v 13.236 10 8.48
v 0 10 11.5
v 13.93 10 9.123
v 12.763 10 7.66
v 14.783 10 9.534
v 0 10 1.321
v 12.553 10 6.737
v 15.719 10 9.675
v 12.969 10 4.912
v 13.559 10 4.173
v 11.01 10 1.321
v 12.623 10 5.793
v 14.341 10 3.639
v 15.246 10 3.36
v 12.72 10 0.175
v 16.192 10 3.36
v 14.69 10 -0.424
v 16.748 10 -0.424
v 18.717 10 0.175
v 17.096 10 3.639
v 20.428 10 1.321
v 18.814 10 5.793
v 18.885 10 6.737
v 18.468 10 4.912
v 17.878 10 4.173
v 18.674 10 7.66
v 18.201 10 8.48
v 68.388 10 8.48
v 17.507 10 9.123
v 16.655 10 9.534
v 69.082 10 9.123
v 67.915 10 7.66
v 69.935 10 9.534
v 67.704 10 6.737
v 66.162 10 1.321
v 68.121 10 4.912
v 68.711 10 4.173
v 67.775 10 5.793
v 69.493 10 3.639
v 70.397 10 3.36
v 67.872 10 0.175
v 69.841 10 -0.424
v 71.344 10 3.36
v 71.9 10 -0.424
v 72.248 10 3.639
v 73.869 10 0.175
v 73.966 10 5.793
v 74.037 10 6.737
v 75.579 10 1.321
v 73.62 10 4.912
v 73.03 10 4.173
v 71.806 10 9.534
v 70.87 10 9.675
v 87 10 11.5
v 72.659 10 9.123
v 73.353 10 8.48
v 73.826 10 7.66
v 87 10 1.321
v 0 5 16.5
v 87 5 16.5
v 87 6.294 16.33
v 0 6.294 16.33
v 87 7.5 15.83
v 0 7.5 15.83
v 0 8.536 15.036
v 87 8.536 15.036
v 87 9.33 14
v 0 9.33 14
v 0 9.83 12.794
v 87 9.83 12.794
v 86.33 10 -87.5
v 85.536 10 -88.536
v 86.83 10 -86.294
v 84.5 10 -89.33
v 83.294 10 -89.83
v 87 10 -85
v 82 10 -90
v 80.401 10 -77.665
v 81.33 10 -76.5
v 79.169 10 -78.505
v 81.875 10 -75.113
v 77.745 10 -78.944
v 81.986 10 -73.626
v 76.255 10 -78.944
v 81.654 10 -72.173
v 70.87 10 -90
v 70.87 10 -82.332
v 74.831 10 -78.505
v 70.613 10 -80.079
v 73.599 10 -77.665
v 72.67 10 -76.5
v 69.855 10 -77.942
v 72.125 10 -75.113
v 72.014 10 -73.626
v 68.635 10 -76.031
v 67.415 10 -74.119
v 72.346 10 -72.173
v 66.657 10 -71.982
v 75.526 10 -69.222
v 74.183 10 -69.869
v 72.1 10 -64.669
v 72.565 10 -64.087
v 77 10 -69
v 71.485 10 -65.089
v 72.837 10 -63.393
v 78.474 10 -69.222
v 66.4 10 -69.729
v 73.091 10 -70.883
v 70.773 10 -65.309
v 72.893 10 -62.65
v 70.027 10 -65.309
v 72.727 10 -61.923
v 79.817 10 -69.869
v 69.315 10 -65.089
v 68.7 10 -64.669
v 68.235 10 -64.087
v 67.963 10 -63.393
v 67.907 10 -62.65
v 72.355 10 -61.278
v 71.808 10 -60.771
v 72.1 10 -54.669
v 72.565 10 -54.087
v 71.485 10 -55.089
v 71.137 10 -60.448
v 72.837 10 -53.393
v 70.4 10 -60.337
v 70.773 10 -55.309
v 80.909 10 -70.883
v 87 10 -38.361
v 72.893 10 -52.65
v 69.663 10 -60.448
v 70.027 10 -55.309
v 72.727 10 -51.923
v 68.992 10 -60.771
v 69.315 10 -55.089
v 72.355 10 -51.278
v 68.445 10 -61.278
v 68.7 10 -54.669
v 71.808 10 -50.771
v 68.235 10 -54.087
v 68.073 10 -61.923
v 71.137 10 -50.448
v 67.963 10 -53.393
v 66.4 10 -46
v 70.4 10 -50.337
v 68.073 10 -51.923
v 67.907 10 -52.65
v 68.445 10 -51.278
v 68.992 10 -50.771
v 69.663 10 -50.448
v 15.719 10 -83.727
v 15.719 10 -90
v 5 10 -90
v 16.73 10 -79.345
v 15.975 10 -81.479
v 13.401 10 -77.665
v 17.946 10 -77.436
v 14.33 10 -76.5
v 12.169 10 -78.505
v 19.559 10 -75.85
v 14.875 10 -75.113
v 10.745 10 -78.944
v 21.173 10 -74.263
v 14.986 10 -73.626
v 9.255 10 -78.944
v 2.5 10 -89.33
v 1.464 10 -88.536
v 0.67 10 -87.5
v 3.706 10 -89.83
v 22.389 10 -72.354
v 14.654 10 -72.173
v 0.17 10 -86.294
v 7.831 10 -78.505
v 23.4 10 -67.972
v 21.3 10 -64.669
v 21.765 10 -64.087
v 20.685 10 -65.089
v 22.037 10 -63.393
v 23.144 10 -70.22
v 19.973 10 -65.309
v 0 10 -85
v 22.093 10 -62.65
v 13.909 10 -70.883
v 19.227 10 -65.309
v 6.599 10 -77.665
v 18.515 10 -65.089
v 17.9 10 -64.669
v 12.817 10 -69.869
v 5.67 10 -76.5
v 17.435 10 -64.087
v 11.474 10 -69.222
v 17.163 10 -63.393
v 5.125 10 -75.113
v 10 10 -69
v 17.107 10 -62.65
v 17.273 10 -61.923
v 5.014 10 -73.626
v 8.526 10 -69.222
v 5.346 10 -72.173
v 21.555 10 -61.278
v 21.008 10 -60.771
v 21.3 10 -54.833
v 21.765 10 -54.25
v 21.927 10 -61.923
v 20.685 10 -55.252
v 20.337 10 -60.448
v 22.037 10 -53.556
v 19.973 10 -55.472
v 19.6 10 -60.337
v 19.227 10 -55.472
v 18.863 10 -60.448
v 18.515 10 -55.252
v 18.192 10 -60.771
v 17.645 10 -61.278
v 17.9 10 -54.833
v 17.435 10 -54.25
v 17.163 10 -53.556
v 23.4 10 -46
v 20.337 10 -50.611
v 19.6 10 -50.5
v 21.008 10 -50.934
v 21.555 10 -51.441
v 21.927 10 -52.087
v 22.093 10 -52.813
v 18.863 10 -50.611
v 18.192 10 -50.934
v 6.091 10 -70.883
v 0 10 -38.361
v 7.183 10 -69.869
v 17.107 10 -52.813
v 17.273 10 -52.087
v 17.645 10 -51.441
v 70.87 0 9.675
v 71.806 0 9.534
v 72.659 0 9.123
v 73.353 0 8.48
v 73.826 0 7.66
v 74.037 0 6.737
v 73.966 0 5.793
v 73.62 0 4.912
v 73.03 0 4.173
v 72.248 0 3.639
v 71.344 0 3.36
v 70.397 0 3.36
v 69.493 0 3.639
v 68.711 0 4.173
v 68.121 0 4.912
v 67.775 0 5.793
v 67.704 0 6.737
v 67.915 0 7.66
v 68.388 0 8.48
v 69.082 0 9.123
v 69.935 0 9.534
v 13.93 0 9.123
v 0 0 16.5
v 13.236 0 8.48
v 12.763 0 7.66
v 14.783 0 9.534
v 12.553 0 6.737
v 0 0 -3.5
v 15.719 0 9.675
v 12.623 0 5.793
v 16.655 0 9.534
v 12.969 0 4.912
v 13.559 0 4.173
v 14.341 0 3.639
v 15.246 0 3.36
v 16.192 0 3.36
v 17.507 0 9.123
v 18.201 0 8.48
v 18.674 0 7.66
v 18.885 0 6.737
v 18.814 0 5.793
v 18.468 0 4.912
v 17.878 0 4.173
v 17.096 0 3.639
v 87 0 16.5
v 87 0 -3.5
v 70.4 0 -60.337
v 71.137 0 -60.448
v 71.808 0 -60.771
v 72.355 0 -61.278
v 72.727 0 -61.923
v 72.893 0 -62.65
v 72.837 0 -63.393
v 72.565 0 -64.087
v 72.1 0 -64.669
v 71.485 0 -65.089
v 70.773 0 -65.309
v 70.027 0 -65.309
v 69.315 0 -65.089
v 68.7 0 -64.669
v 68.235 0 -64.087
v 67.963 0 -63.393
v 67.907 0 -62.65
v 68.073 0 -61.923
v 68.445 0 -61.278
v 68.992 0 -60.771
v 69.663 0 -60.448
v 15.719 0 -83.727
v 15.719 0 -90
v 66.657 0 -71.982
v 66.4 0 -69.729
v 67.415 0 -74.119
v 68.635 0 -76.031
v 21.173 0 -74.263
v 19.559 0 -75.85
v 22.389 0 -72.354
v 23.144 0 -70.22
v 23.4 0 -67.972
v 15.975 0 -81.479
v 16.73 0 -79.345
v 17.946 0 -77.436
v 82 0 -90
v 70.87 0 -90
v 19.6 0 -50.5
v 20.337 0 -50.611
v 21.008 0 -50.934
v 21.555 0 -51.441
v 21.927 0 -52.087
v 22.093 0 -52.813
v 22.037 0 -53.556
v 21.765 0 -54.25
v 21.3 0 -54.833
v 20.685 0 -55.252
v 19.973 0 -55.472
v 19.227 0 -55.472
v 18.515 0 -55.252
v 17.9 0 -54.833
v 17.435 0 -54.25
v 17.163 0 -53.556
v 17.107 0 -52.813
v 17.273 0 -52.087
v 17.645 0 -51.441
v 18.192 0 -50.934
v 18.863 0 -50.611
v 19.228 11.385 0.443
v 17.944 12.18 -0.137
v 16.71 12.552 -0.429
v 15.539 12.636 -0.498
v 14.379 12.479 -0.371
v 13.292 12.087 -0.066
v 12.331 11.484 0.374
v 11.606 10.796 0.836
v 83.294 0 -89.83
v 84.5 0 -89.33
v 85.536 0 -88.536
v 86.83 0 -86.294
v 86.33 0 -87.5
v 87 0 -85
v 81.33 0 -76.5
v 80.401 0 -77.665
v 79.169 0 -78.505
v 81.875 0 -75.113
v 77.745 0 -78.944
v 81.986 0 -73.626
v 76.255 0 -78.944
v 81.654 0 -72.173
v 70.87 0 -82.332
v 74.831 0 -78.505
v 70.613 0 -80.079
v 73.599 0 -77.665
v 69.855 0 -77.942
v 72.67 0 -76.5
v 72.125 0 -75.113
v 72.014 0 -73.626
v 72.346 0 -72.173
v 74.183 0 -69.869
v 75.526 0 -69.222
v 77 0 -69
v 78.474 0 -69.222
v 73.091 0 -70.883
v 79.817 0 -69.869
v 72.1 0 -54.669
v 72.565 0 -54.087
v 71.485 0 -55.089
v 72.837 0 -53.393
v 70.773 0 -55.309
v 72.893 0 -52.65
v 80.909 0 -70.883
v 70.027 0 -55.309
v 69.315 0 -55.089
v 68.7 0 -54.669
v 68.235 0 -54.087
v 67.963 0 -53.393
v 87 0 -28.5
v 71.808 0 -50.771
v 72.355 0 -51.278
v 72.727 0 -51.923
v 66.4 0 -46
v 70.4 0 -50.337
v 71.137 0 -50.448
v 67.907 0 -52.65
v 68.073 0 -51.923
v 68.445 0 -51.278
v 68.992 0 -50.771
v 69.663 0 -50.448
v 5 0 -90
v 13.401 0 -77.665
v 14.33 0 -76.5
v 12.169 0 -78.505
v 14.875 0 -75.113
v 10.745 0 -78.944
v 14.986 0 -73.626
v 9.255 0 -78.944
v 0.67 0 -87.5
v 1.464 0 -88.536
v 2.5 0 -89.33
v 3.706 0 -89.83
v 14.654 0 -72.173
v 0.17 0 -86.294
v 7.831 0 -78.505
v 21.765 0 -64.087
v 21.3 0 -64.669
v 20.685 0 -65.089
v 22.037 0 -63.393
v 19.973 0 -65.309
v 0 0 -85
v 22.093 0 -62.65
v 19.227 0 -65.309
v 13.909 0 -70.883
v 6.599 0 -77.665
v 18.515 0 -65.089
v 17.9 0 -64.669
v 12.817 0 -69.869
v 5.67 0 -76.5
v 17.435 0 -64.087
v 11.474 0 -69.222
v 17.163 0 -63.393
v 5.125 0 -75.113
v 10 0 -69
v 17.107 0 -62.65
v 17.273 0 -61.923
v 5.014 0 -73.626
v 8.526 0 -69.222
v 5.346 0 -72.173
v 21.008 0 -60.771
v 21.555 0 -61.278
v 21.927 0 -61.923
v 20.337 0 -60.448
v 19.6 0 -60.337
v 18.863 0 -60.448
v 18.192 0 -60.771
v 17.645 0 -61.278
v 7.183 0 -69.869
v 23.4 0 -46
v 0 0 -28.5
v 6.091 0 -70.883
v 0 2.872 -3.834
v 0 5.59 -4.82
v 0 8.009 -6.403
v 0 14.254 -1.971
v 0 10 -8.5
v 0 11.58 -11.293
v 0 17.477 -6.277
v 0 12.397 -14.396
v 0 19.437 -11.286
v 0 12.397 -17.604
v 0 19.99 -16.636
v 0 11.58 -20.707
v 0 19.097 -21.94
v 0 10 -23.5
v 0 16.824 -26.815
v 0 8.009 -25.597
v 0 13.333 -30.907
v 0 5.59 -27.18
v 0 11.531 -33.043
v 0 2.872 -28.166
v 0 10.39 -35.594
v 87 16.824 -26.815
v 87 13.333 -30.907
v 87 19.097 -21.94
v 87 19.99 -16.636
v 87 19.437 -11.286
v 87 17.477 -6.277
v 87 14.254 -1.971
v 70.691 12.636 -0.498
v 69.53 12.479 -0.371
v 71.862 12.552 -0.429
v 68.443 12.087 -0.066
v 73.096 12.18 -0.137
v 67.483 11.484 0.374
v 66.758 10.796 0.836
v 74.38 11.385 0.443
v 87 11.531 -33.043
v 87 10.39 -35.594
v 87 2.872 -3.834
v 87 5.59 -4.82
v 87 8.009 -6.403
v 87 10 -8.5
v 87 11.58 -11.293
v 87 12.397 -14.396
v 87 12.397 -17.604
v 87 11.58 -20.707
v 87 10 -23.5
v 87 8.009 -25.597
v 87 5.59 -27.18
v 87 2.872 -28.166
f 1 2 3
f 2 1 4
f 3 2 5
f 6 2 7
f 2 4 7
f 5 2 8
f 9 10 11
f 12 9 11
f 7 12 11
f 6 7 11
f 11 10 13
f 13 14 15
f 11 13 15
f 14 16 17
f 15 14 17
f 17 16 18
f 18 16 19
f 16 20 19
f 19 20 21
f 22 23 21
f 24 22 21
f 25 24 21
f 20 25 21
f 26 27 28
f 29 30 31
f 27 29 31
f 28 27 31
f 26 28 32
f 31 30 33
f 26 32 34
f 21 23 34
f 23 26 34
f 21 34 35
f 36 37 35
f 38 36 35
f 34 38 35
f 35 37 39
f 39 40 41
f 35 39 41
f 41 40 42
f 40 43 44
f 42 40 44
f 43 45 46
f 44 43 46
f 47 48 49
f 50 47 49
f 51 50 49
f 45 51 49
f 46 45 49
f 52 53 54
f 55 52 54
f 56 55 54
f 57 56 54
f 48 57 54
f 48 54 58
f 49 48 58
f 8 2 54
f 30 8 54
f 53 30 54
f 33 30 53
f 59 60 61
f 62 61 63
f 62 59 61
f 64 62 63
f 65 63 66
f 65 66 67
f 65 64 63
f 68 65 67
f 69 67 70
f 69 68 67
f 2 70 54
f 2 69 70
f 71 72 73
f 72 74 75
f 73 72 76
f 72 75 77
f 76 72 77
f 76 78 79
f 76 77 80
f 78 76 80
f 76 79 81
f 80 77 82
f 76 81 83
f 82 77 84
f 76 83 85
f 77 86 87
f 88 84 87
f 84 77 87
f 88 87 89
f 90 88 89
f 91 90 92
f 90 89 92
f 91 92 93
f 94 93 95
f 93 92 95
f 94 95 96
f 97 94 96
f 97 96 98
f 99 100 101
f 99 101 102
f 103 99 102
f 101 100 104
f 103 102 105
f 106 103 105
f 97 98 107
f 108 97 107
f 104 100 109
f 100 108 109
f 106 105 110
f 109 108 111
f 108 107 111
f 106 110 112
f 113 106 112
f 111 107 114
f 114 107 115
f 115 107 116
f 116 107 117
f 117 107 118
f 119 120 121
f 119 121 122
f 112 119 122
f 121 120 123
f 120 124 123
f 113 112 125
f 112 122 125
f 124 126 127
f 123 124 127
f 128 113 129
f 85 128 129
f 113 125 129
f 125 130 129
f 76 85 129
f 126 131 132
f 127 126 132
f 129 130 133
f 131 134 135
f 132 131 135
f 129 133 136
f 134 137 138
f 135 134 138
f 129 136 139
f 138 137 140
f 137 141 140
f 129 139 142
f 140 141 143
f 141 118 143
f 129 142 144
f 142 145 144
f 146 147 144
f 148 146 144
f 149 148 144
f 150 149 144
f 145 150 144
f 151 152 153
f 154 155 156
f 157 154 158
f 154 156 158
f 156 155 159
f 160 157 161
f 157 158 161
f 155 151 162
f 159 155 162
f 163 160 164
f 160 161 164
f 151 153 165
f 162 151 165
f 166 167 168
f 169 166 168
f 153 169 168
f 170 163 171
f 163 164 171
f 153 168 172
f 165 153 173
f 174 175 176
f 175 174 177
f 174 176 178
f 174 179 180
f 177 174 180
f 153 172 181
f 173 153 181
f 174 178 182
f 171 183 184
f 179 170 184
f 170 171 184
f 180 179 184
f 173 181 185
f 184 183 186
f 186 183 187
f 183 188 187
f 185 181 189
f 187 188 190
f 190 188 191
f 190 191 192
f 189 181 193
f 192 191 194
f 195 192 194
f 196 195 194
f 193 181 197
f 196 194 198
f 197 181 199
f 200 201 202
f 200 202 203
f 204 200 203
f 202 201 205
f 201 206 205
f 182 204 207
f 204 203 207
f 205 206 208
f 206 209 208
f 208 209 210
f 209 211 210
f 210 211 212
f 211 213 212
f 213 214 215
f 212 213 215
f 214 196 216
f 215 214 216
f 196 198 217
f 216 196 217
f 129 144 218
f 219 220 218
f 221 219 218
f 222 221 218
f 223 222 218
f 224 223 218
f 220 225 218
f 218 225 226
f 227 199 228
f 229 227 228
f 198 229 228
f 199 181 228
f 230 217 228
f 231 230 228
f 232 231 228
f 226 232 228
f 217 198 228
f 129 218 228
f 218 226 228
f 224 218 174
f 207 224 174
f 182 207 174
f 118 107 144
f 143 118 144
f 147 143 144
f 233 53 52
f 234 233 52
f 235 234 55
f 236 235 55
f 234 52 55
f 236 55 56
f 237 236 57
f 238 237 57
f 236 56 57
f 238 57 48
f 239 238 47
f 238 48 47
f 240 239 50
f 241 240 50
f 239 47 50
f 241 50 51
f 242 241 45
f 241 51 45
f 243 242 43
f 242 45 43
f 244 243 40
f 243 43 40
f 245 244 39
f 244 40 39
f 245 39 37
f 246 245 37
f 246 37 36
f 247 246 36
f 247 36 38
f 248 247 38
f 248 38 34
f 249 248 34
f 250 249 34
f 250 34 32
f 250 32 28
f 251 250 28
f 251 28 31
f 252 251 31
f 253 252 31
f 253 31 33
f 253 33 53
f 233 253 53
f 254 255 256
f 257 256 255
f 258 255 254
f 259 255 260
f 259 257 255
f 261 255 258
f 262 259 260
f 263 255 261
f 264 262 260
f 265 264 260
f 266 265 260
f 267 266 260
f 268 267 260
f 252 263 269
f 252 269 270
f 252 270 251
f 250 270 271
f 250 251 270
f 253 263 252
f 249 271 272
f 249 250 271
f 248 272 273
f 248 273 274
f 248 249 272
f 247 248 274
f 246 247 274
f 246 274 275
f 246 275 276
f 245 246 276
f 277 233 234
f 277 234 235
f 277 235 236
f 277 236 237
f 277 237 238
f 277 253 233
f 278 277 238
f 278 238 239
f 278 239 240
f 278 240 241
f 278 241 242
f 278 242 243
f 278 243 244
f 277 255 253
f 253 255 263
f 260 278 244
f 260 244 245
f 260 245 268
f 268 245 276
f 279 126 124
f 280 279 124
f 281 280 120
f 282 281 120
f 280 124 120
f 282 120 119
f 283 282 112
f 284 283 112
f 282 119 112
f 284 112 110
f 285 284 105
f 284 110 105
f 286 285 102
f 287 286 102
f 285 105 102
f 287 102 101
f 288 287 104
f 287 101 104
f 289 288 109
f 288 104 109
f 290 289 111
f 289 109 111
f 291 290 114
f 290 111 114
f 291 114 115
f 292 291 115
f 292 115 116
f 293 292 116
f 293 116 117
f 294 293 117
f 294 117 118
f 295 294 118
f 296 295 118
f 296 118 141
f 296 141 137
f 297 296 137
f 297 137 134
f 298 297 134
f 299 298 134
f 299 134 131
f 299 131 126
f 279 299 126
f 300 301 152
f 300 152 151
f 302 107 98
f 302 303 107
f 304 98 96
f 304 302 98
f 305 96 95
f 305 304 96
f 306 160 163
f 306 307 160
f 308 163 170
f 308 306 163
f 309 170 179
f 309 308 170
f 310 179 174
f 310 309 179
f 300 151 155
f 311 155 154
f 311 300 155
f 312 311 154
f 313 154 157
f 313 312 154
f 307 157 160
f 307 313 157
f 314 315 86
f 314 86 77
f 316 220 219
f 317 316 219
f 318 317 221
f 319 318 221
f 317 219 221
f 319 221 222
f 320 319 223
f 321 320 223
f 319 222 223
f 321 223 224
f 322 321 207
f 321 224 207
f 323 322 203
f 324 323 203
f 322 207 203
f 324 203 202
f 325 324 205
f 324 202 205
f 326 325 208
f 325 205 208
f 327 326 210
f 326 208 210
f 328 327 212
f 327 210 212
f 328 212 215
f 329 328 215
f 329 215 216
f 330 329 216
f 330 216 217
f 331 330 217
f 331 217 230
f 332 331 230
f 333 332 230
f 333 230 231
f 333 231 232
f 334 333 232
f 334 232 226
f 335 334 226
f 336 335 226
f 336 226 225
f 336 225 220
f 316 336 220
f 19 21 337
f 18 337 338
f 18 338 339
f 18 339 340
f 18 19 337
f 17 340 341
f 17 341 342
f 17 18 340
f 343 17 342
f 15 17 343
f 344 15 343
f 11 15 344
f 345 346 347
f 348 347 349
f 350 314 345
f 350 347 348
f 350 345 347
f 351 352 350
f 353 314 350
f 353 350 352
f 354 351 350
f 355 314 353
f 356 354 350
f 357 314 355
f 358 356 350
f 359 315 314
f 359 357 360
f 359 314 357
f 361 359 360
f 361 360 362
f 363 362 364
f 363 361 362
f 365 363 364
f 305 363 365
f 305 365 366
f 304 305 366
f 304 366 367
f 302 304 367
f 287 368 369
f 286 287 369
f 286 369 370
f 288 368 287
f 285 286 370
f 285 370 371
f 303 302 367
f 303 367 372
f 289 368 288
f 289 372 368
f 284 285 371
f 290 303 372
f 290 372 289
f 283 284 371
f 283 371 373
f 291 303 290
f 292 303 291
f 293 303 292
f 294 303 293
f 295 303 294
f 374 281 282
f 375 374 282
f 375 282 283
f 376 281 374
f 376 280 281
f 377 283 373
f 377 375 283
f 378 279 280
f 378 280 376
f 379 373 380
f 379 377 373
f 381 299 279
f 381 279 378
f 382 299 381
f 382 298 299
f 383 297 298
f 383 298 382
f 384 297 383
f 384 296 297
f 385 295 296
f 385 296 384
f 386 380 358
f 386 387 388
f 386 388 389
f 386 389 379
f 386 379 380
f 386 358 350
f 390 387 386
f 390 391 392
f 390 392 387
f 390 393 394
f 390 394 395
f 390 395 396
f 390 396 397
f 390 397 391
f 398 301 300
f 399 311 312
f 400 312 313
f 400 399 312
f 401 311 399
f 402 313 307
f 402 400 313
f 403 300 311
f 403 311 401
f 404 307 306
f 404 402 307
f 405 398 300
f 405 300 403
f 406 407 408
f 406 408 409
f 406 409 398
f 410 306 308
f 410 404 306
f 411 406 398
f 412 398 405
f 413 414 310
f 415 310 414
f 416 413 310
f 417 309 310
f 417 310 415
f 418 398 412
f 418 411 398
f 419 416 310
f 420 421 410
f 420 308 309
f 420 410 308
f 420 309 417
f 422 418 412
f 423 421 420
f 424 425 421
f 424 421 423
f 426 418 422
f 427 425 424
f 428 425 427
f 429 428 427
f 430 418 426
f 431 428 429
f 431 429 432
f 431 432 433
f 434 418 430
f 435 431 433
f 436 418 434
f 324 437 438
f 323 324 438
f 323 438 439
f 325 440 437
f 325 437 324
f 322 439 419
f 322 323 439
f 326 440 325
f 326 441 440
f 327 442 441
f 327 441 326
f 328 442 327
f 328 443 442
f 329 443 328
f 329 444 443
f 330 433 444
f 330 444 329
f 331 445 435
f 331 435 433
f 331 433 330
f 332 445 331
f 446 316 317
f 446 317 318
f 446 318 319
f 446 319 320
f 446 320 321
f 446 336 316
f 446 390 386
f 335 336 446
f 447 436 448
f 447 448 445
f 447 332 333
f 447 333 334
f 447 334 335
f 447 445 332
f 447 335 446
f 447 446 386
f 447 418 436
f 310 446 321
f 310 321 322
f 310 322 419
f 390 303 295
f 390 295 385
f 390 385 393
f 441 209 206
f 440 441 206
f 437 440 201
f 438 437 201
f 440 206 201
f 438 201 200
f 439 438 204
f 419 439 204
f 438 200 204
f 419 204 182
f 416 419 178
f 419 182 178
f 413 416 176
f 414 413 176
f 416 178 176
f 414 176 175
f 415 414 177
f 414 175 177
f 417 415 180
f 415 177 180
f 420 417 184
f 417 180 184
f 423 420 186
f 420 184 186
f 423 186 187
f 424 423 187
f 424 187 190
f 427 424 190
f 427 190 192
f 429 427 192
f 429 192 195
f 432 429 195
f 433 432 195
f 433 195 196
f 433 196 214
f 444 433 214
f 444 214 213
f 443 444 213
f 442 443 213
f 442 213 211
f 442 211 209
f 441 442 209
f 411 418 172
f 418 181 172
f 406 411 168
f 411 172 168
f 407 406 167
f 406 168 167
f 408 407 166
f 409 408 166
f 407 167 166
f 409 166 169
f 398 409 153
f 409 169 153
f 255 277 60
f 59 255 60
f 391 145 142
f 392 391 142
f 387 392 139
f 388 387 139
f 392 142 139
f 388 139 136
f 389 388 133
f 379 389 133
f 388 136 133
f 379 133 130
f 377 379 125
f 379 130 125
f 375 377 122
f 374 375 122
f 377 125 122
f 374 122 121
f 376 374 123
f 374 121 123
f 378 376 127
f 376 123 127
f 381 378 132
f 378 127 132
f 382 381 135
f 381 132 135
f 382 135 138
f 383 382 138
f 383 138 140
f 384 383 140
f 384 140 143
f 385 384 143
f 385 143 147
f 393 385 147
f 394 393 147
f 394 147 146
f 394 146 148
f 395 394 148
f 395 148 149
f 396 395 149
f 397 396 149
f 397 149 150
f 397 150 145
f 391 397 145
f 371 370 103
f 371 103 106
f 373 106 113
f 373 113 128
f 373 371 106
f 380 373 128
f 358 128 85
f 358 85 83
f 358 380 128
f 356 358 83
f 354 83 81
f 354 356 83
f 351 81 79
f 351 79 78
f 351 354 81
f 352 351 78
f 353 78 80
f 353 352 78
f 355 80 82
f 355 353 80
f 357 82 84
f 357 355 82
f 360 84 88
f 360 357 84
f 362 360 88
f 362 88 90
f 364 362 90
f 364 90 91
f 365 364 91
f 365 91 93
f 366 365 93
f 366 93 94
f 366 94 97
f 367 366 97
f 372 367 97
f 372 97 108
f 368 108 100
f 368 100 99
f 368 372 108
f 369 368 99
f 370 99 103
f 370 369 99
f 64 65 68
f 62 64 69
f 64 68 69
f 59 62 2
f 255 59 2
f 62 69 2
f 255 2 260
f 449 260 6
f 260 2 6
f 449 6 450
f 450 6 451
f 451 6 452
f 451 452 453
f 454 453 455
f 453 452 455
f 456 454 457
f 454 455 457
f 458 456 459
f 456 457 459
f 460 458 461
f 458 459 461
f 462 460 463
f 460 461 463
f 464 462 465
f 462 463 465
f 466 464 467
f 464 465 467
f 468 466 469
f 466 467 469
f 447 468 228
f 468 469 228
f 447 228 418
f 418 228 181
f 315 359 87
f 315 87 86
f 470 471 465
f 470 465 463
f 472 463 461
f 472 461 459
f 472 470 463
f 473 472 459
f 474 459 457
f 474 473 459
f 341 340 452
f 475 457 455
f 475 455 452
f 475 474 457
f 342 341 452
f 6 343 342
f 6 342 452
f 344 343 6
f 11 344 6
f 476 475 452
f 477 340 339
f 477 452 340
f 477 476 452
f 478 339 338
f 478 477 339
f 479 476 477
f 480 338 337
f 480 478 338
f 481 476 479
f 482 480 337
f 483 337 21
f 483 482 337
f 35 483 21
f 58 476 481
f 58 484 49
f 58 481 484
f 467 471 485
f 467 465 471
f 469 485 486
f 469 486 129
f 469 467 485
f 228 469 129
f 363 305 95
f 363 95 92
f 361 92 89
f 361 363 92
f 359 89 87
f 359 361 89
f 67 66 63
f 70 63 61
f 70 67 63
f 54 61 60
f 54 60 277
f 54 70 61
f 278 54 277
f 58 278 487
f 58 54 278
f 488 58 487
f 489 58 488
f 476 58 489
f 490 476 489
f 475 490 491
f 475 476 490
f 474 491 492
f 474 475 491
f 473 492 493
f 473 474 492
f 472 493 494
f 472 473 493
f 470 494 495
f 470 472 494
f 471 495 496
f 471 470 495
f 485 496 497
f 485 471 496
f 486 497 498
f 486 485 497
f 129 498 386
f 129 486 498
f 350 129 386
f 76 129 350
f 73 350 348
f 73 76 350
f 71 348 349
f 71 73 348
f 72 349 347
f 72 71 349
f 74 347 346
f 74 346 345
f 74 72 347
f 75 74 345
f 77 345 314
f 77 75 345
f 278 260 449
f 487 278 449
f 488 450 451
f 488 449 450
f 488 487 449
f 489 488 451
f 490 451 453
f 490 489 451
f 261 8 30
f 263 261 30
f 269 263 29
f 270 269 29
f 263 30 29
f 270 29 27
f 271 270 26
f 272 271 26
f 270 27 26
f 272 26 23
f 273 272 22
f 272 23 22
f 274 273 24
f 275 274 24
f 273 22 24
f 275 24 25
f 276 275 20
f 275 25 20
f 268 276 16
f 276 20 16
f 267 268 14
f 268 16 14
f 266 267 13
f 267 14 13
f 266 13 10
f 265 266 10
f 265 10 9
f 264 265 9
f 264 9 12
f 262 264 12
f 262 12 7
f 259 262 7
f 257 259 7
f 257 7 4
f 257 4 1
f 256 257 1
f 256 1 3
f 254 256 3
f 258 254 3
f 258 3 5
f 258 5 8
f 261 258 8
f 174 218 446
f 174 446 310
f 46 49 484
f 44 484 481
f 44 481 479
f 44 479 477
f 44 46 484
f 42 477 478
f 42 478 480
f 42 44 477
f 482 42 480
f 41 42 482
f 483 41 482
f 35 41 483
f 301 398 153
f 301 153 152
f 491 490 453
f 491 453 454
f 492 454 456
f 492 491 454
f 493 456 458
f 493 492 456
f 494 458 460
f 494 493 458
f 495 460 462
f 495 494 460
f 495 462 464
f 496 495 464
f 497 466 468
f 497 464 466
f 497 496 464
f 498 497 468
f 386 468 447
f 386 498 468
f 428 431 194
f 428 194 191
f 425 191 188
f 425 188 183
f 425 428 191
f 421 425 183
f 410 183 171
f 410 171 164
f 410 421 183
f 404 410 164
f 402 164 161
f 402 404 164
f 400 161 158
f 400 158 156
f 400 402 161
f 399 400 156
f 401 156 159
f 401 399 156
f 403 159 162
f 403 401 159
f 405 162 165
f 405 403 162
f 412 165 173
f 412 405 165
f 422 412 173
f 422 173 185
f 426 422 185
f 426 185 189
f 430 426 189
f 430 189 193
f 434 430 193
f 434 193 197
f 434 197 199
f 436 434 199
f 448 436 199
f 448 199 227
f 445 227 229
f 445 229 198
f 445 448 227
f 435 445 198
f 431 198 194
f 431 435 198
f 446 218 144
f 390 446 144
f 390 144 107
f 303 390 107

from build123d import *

# Parameters (mm, degrees)
SKETCH1_R           = 5
BOSS_EXTRUDE1_DEPTH = 10
SKETCH3_R           = 2.5
SKETCH3_W           = 43
SKETCH3_H           = 28
CUT_EXTRUDE1_DEPTH  = 126.574678976
FILLET1_R           = 10
FILLET2_R           = 10
BOSS_EXTRUDE2_DEPTH = 87
SKETCH4_4_R         = 12.5
CUT_EXTRUDE3_DEPTH  = 87
FILLET3_R           = 10
SKETCH8_W           = 40
SKETCH8_H           = 23.261660468
CUT_EXTRUDE8_DEPTH  = 87
SKETCH9_W           = 20
SKETCH9_H           = 10
BOSS_EXTRUDE3_DEPTH = 87
FILLET4_R           = 5
SKETCH10_R          = 3.175
CUT_EXTRUDE9_DEPTH  = 126.574678976
FILLET5_R           = 5
SKETCH11_R          = 7
CUT_EXTRUDE10_DEPTH = 126.574678976


with BuildPart() as part:
    # Sketch1 → Boss-Extrude1 (new body)
    with BuildSketch(Plane(origin=(0, 0, 0), x_dir=(1, 0, 0), z_dir=(0, 1, 0))):
        Polygon((0, 90), (15.718723237, 90), (15.718723237, 74), (70.870392539, 74), (70.870392539, 90), (87, 90), (87, 0), (0, 0), align=None)
        with Locations(Location((10, 74, 0), (0, 0, 270))):
            Circle(SKETCH1_R, mode=Mode.SUBTRACT)
        with Locations(Location((77, 74, 0), (0, 0, 270))):
            Circle(SKETCH1_R, mode=Mode.SUBTRACT)
    extrude(amount=BOSS_EXTRUDE1_DEPTH)

    # Sketch3 → Cut-Extrude1 (cut, through all)
    with BuildSketch(Plane(origin=(0, 10, 0), x_dir=(1, 0, 0), z_dir=(0, 1, 0))):
        with Locations(Location((19.6, 53, 0), (0, 0, 270))):
            Circle(SKETCH3_R)
        with Locations(Location((70.4, 62.836666102, 0), (0, 0, 270))):
            Circle(SKETCH3_R)
        with Locations(Location((70.4, 52.836666102, 0), (0, 0, 270))):
            Circle(SKETCH3_R)
        with Locations((44.9, 60)):
            Rectangle(SKETCH3_W, SKETCH3_H)
        with Locations(Location((19.6, 62.836666102, 0), (0, 0, 270))):
            Circle(SKETCH3_R)
    extrude(amount=-CUT_EXTRUDE1_DEPTH, mode=Mode.SUBTRACT)

    # Fillet1
    # the kernel refuses this fillet: 10 mm, written as the material it adds along each edge
    with BuildSketch(Plane(origin=(70.870392539, 0, -74), x_dir=(0, 0, -1), z_dir=(0, 1, 0))) as fillet1_piece_1:
        with BuildLine():
            CenterArc((8.332073051, 10), FILLET1_R, 213.570370594, 56.429629406)
            Line((0, 4.470392539), (-0.166641461, 4.359800389))
            ThreePointArc((-0.166641461, 4.359800389), (-0.2, 2.235196269), (-0.2, 0))
            Line((-0.2, 0), (0, -0.2))
            Line((0, -0.2), (8.332073051, -0.2))
            Line((8.332073051, -0.2), (8.332073051, 0))
        make_face()
    extrude(amount=10)
    with BuildSketch(Plane(origin=(15.718723237, 0, -74), x_dir=(0, 0, -1), z_dir=(0, 1, 0))) as fillet1_piece_2:
        with BuildLine():
            CenterArc((9.727462287, -10), FILLET1_R, 90, 76.592671632)
            Line((0, -7.681276763), (-0.194549246, -7.634902298))
            ThreePointArc((-0.194549246, -7.634902298), (-0.2, -3.840638382), (-0.2, 0))
            Line((-0.2, 0), (0, 0.2))
            Line((0, 0.2), (9.727462287, 0.2))
            Line((9.727462287, 0.2), (9.727462287, 0))
        make_face()
    extrude(amount=10)

    # Fillet2
    fillet2_edges = [part.edges().sort_by_distance(p)[0] for p in [
        (66.4, 5, -74),
        (23.4, 5, -74),
    ]]
    fillet(fillet2_edges, radius=FILLET2_R)

    # Sketch4 → Boss-Extrude2 (add)
    with BuildSketch(Plane(origin=(87, 0, 0), x_dir=(0, 0, -1), z_dir=(1, 0, 0))):
        with BuildLine():
            Line((36, 0), (0, 0))
            Line((0, 0), (0, 10))
            Line((0, 10), (8.5, 10))
            ThreePointArc((8.5, 10), (16, 12.5), (23.5, 10))
            Line((23.5, 10), (33.320508076, 10))
            ThreePointArc((33.320508076, 10), (-3.318516526, -5.176380902), (36, 0))
        make_face()
    extrude(amount=-BOSS_EXTRUDE2_DEPTH)

    # Sketch4<4> → Cut-Extrude3 (cut)
    with BuildSketch(Plane(origin=(87, 0, 0), x_dir=(0, 0, -1), z_dir=(1, 0, 0))):
        with Locations((16, 0)):
            Circle(SKETCH4_4_R)
    extrude(amount=-CUT_EXTRUDE3_DEPTH, mode=Mode.SUBTRACT)

    # Fillet3
    fillet3_edges = [part.edges().sort_by_distance(p)[0] for p in [
        (43.5, 10, -33.320508076),
    ]]
    fillet(fillet3_edges, radius=FILLET3_R)

    # Sketch8 → Cut-Extrude8 (cut)
    with BuildSketch(Plane(origin=(87, 0, 0), x_dir=(0, 0, -1), z_dir=(1, 0, 0))):
        with Locations((16, -11.630830234)):
            Rectangle(SKETCH8_W, SKETCH8_H)
    extrude(amount=-CUT_EXTRUDE8_DEPTH, mode=Mode.SUBTRACT)

    # Sketch9 → Boss-Extrude3 (add)
    with BuildSketch(Plane(origin=(87, 0, 0), x_dir=(0, 0, -1), z_dir=(1, 0, 0))):
        with Locations((-6.5, 5)):
            Rectangle(SKETCH9_W, SKETCH9_H)
    extrude(amount=-BOSS_EXTRUDE3_DEPTH)

    # Fillet4
    fillet4_edges = [part.edges().sort_by_distance(p)[0] for p in [
        (43.5, 10, 16.5),
    ]]
    fillet(fillet4_edges, radius=FILLET4_R)

    # Sketch10 → Cut-Extrude9 (cut, through all)
    with BuildSketch(Plane(origin=(0, 10, 0), x_dir=(1, 0, 0), z_dir=(0, 1, 0))):
        with Locations(Location((15.718723237, -6.5, 0), (0, 0, 270))):
            Circle(SKETCH10_R)
        with Locations(Location((70.870392539, -6.5, 0), (0, 0, 270))):
            Circle(SKETCH10_R)
    extrude(amount=-CUT_EXTRUDE9_DEPTH, mode=Mode.SUBTRACT)

    # Fillet5
    fillet5_edges = [part.edges().sort_by_distance(p)[0] for p in [
        (0, 5, -90),
        (87, 5, -90),
    ]]
    fillet(fillet5_edges, radius=FILLET5_R)

    # Sketch11 → Cut-Extrude10 (cut, through all)
    with BuildSketch(Plane(origin=(0, 10, 0), x_dir=(1, 0, 0), z_dir=(0, 1, 0))):
        with Locations((15.718723237, -6.5)):
            Circle(SKETCH11_R)
        with Locations((70.870392539, -6.5)):
            Circle(SKETCH11_R)
    extrude(amount=CUT_EXTRUDE10_DEPTH, mode=Mode.SUBTRACT)


solid = part.part
